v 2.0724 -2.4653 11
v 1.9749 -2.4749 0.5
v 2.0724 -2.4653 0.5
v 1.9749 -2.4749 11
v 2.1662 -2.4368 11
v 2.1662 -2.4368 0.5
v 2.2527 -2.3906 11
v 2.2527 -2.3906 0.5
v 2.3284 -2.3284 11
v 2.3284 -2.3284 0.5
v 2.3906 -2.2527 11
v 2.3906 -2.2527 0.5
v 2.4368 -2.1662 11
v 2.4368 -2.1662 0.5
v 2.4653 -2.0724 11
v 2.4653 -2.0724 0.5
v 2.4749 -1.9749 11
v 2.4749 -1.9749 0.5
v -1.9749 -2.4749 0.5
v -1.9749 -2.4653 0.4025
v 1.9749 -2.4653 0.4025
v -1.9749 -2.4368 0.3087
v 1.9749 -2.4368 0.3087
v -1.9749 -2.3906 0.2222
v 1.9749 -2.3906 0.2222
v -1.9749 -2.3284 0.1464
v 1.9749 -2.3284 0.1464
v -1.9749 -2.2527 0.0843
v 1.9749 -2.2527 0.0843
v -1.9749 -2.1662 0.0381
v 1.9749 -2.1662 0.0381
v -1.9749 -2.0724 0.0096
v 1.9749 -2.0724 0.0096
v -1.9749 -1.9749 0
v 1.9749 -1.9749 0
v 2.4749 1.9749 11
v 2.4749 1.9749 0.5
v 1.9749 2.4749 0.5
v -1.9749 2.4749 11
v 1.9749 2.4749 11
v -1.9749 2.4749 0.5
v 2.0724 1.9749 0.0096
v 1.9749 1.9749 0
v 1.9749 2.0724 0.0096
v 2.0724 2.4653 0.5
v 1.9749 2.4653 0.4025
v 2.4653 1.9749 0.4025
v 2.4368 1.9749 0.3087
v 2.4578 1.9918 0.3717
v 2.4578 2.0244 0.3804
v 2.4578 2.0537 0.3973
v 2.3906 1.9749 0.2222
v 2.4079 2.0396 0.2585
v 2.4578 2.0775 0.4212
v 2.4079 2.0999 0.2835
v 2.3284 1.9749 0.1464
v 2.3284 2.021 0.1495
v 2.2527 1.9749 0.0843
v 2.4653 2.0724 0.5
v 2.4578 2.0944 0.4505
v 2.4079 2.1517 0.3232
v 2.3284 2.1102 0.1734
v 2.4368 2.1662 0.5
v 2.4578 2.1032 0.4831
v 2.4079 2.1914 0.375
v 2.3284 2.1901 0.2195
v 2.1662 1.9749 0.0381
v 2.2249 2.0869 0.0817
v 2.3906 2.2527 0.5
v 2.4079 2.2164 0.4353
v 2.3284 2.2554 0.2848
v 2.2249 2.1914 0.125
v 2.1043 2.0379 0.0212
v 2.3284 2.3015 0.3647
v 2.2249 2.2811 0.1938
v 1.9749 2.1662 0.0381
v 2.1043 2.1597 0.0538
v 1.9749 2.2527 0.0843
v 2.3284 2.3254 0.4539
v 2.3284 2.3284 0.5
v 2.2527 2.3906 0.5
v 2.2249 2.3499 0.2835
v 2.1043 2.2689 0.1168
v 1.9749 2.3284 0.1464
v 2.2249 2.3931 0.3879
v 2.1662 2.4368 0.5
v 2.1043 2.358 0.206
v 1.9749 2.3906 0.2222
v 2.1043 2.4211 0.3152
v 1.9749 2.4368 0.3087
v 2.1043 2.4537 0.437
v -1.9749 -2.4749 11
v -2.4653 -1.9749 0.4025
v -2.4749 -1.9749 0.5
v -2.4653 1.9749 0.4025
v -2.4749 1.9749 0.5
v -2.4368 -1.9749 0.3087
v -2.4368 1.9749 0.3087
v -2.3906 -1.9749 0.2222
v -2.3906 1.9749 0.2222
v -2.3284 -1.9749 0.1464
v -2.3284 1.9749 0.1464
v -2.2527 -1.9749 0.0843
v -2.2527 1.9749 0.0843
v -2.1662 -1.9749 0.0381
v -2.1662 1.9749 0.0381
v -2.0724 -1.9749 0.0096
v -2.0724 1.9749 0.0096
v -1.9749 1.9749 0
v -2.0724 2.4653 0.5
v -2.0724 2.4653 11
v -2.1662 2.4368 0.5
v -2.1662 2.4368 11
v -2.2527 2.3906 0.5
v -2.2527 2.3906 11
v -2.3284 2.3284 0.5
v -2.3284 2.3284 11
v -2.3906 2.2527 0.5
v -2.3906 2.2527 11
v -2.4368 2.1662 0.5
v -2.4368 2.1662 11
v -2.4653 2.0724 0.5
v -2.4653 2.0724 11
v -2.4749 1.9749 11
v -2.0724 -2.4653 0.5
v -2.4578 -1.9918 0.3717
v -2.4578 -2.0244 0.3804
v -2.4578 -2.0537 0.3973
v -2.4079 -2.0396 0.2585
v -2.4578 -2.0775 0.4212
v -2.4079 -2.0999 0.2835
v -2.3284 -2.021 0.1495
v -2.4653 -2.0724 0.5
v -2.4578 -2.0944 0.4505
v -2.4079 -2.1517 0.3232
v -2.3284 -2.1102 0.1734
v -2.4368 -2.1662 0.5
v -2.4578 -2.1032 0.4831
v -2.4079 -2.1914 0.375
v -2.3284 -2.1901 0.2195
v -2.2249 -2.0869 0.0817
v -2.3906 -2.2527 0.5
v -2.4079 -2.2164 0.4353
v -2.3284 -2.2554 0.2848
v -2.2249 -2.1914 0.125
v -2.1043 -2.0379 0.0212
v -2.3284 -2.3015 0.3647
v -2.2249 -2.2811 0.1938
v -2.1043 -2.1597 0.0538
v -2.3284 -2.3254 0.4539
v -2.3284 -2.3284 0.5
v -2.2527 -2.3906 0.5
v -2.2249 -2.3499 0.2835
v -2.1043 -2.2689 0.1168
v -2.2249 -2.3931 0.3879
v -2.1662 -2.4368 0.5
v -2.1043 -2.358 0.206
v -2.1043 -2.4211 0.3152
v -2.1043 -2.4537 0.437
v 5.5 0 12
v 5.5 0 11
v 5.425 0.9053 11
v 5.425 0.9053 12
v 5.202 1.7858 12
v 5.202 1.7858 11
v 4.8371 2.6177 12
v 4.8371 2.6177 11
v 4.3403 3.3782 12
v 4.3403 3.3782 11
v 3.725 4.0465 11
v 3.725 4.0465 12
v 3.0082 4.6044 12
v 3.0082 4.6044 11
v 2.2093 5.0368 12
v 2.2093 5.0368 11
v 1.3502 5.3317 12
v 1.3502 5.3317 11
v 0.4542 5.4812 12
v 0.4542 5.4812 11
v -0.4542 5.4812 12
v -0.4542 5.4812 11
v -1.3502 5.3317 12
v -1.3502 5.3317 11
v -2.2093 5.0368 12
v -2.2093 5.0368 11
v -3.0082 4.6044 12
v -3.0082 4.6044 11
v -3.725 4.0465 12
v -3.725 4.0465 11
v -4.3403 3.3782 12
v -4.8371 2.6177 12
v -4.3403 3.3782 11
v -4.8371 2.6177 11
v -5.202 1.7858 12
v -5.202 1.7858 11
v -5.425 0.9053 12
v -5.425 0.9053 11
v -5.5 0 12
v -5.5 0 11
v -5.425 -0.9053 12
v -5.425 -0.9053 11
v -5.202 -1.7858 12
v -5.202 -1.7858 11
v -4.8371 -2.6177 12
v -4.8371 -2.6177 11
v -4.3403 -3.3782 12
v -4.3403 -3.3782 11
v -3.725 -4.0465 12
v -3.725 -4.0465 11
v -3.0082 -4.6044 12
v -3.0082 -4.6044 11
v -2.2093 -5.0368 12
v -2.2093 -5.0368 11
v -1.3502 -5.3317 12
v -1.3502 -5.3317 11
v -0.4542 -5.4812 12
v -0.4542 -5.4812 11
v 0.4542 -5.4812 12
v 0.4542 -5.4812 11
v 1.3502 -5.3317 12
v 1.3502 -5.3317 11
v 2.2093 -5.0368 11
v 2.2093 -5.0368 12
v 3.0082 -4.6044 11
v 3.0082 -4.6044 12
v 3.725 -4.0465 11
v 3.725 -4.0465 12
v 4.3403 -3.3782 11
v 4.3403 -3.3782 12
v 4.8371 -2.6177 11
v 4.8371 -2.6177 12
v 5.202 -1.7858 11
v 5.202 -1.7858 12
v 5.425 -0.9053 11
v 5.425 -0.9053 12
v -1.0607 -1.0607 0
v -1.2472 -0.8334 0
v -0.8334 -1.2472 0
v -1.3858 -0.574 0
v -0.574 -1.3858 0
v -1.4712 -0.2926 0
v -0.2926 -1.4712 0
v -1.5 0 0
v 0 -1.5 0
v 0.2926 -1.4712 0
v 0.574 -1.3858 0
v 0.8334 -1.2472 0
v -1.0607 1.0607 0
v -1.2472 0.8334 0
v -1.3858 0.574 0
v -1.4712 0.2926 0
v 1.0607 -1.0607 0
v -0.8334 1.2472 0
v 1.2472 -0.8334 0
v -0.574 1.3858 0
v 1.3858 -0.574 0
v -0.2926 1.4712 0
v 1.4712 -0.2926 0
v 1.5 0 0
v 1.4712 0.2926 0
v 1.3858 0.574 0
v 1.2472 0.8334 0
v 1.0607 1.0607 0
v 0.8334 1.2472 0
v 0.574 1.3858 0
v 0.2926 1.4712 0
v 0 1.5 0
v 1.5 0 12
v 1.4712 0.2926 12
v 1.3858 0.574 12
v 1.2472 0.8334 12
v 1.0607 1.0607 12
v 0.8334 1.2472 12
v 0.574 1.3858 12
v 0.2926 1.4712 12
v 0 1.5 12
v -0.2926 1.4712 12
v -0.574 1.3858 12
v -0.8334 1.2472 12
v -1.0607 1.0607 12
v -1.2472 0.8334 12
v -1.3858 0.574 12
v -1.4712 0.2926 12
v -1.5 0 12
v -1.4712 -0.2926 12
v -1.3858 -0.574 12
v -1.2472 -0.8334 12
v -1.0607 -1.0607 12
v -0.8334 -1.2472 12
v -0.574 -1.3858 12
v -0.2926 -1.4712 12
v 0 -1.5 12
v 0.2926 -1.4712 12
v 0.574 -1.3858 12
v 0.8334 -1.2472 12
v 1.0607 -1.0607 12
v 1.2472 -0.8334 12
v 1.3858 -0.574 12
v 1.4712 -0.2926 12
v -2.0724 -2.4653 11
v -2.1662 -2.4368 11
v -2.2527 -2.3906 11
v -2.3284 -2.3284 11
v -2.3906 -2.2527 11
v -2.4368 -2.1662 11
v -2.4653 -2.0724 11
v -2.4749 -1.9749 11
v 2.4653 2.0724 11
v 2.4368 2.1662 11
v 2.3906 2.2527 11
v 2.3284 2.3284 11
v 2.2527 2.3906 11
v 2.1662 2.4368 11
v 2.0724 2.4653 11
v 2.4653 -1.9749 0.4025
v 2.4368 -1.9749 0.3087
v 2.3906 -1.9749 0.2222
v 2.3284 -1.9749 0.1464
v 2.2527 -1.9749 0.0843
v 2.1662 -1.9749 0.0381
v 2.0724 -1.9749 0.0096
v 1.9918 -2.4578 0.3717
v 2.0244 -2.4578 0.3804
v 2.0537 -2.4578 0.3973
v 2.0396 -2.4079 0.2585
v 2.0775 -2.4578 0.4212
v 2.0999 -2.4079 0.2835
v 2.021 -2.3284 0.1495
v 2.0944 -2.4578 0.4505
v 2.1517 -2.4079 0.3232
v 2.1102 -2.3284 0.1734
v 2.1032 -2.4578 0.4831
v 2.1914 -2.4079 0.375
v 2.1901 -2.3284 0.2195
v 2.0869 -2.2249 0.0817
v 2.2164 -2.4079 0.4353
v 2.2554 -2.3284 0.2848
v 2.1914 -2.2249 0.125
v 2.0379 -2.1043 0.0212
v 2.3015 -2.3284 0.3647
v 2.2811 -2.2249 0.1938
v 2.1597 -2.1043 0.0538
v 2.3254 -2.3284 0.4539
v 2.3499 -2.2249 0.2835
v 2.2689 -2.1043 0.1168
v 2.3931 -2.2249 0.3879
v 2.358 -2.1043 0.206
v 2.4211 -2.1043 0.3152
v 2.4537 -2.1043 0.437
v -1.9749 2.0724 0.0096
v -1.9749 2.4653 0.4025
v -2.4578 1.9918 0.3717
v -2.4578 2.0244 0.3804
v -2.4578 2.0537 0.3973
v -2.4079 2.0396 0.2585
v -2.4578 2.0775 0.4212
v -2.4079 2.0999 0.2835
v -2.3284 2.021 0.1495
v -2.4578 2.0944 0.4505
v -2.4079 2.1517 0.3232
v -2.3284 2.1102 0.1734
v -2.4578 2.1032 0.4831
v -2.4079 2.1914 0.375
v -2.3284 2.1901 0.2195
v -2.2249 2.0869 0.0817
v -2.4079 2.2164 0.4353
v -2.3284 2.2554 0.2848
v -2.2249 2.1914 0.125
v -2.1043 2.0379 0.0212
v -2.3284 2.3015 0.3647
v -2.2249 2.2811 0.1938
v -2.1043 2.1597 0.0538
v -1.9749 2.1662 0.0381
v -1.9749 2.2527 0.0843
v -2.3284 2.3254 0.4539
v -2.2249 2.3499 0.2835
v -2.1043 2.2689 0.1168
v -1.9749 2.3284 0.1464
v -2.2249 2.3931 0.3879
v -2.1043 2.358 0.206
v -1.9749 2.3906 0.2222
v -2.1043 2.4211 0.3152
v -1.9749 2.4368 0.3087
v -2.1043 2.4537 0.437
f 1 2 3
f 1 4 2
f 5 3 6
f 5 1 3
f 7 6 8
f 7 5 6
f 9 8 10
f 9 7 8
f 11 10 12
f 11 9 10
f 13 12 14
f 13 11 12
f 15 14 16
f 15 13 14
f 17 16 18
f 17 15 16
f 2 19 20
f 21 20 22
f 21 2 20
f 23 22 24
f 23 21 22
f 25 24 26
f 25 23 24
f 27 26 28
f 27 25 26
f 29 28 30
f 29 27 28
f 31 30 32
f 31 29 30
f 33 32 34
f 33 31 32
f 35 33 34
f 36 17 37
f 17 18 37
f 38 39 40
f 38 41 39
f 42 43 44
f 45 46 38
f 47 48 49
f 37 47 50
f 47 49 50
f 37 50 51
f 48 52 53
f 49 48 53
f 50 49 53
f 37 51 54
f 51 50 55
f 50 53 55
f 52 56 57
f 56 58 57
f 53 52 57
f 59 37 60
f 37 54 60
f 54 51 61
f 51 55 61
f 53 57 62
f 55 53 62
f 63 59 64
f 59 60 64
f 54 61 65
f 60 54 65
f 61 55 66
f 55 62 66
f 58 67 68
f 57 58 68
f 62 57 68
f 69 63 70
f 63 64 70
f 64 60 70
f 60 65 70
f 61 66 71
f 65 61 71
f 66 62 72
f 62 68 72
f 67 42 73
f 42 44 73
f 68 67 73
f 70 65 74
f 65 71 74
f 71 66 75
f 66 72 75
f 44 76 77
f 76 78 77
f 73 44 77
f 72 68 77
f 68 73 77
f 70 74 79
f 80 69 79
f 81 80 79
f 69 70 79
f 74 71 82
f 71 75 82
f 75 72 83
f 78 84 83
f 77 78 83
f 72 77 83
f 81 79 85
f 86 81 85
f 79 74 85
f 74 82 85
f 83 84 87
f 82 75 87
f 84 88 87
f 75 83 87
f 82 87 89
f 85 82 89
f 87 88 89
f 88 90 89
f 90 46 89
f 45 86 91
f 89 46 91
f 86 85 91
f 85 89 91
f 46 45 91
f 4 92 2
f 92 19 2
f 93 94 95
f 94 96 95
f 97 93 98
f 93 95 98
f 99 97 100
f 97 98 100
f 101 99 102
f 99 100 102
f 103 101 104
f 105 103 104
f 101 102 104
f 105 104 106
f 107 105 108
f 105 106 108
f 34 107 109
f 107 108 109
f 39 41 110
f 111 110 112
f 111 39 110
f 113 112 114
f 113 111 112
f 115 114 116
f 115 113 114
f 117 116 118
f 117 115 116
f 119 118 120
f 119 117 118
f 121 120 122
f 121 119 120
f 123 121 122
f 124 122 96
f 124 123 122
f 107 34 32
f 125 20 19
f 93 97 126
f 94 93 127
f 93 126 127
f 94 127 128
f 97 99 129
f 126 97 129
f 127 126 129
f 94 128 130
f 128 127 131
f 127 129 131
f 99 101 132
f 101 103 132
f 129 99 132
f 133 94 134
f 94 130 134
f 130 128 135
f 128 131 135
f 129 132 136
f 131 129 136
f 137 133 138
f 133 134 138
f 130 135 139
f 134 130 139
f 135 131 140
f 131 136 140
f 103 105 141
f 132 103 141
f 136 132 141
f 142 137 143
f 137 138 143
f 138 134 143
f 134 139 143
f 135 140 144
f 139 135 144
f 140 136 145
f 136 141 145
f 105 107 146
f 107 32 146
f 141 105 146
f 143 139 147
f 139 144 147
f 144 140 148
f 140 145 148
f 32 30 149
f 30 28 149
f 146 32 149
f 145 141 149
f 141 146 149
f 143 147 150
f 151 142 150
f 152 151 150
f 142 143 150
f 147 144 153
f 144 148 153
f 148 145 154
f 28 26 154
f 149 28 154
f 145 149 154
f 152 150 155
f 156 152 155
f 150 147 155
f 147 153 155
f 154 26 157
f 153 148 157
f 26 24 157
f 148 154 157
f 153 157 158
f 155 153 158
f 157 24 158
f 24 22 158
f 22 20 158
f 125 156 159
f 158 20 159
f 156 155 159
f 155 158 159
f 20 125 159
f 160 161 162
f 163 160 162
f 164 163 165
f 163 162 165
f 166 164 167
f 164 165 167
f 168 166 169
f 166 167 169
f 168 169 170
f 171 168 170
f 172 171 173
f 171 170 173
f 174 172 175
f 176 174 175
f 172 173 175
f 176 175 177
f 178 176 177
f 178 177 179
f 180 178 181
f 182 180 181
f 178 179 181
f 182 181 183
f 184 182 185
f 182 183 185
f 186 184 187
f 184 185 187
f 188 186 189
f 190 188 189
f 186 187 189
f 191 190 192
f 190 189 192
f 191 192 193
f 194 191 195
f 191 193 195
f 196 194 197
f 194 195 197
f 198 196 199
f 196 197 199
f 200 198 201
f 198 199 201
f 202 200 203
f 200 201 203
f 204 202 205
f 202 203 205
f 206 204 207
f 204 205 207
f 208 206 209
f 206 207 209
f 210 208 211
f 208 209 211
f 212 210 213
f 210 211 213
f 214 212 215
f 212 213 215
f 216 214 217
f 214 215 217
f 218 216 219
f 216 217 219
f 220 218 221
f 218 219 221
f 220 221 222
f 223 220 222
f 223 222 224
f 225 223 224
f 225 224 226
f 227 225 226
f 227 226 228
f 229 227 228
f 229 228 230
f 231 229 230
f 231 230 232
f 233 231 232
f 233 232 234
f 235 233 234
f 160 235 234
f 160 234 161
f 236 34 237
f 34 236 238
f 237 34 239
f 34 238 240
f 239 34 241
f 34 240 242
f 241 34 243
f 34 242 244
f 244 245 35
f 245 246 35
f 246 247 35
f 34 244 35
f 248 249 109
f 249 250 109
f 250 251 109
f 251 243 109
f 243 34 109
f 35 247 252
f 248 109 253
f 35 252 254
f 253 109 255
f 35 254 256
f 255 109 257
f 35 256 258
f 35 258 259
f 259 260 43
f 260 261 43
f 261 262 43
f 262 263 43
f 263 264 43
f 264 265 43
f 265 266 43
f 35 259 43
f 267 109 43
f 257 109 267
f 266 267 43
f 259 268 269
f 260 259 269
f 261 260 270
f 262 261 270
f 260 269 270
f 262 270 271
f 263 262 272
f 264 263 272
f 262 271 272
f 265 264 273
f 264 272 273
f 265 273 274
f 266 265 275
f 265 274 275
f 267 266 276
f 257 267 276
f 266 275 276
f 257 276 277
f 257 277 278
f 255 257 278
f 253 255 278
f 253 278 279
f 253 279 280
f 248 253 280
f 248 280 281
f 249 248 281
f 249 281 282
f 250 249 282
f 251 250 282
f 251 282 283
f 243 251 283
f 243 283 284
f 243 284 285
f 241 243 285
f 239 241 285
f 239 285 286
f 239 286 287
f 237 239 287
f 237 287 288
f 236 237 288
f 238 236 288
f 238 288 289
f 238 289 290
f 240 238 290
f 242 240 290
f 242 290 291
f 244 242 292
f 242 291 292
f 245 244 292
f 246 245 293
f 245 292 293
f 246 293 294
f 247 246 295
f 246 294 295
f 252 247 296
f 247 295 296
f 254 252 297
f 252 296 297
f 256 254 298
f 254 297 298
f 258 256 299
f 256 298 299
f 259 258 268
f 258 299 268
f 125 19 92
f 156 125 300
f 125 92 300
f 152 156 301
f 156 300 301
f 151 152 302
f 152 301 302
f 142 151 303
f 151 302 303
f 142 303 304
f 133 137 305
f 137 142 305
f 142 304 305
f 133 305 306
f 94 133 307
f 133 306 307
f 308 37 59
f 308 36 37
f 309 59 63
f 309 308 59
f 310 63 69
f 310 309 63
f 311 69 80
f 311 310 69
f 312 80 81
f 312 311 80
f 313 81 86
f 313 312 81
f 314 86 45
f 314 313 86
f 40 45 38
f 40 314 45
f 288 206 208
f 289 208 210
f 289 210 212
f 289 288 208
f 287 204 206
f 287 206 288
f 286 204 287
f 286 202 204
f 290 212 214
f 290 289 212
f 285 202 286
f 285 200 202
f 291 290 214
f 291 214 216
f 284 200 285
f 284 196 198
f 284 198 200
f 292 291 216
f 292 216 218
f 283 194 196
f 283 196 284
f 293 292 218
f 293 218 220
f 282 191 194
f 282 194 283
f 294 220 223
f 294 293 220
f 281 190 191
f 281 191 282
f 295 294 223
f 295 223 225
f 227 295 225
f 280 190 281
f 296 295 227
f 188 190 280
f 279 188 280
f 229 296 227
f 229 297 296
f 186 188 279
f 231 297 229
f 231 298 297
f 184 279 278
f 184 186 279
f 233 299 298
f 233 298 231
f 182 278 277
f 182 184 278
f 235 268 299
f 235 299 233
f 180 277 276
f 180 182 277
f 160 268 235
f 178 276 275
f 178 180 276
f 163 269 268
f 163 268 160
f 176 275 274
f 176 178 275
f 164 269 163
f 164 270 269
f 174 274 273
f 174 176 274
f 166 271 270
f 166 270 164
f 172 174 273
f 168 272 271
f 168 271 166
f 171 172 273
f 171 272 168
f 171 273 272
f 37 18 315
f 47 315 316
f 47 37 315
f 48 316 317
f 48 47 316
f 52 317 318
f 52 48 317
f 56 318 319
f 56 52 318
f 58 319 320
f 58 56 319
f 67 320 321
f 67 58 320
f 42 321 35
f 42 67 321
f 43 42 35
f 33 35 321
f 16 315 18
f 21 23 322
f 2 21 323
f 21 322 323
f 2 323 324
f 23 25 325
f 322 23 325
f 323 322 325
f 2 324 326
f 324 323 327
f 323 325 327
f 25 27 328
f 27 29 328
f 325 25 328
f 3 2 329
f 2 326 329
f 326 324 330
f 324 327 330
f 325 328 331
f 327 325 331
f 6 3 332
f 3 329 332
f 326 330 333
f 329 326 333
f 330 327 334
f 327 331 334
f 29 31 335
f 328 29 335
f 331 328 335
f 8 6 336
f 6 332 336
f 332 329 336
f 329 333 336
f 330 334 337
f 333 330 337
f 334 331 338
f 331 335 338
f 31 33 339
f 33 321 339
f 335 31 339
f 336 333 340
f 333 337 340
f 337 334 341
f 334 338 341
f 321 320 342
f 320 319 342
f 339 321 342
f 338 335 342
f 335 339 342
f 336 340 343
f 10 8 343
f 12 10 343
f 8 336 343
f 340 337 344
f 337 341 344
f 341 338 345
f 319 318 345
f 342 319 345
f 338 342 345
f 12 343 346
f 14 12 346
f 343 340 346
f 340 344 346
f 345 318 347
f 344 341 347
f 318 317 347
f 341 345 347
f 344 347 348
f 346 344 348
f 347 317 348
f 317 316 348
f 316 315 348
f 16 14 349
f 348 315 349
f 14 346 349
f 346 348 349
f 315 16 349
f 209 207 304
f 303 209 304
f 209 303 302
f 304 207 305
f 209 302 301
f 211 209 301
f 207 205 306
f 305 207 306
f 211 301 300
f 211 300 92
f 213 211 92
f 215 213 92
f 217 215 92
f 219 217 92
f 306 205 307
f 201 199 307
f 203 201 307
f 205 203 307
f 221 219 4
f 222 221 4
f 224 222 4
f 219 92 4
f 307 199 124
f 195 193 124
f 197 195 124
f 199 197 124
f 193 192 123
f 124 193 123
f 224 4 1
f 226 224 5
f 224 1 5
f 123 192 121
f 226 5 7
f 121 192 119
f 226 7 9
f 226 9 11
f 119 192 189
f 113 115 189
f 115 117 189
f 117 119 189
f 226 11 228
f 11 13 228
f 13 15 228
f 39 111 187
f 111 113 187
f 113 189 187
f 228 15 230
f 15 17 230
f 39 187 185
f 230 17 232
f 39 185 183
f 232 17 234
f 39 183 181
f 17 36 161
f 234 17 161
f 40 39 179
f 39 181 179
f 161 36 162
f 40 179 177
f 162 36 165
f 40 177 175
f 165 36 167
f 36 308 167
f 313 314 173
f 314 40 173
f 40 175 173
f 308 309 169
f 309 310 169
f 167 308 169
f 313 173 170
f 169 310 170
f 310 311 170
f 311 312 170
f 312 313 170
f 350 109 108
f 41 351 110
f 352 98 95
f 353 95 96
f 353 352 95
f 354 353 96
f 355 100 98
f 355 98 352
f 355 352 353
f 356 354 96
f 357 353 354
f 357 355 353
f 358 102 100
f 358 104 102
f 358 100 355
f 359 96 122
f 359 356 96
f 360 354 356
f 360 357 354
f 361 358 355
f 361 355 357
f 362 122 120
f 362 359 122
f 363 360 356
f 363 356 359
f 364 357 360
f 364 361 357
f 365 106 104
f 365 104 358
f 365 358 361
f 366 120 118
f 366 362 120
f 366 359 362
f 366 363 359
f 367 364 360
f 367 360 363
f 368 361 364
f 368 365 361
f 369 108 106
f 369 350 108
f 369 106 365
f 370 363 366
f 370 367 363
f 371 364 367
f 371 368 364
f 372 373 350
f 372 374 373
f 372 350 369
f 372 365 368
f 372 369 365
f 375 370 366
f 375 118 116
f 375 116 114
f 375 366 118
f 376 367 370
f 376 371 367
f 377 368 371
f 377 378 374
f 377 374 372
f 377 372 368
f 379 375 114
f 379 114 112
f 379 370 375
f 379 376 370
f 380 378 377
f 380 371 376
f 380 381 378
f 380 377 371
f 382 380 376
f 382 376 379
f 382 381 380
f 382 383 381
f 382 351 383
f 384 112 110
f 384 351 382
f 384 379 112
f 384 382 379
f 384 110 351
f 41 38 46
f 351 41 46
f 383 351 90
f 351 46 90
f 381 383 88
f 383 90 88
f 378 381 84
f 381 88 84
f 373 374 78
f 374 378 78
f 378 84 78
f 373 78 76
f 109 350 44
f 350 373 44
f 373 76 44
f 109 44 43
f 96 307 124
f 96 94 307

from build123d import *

# Parameters (mm, degrees)
ESQUISSE1_W      = 4.949747468
ESQUISSE1_H      = 4.949747468
EXTRUSION1_DEPTH = 11
ESQUISSE2_R      = 5.5
EXTRUSION2_DEPTH = 1
ESQUISSE3_R      = 1.5
EXTRUSION3_DEPTH = 15.300349646
CONG_1_R         = 0.5


with BuildPart() as part:
    # Esquisse1 → Extrusion1 (new body)
    with BuildSketch(Plane.XY):
        Rectangle(ESQUISSE1_W, ESQUISSE1_H)
    extrude(amount=EXTRUSION1_DEPTH)

    # Esquisse2 → Extrusion2 (add)
    with BuildSketch(Plane.XY.offset(11)):
        Circle(ESQUISSE2_R)
    extrude(amount=EXTRUSION2_DEPTH)

    # Esquisse3 → Extrusion3 (cut, through all)
    with BuildSketch(Plane.XY.offset(12)):
        Circle(ESQUISSE3_R)
    extrude(amount=-EXTRUSION3_DEPTH, mode=Mode.SUBTRACT)

    # Congé1
    cong_1_edges = [part.edges().sort_by_distance(p)[0] for p in [
        (0, 2.474873734, 0),
        (2.474873734, 0, 0),
        (0, -2.474873734, 0),
        (-2.474873734, 0, 0),
        (-2.474873734, 2.474873734, 5.5),
        (2.474873734, 2.474873734, 5.5),
        (2.474873734, -2.474873734, 5.5),
        (-2.474873734, -2.474873734, 5.5),
    ]]
    fillet(cong_1_edges, radius=CONG_1_R)


solid = part.part
